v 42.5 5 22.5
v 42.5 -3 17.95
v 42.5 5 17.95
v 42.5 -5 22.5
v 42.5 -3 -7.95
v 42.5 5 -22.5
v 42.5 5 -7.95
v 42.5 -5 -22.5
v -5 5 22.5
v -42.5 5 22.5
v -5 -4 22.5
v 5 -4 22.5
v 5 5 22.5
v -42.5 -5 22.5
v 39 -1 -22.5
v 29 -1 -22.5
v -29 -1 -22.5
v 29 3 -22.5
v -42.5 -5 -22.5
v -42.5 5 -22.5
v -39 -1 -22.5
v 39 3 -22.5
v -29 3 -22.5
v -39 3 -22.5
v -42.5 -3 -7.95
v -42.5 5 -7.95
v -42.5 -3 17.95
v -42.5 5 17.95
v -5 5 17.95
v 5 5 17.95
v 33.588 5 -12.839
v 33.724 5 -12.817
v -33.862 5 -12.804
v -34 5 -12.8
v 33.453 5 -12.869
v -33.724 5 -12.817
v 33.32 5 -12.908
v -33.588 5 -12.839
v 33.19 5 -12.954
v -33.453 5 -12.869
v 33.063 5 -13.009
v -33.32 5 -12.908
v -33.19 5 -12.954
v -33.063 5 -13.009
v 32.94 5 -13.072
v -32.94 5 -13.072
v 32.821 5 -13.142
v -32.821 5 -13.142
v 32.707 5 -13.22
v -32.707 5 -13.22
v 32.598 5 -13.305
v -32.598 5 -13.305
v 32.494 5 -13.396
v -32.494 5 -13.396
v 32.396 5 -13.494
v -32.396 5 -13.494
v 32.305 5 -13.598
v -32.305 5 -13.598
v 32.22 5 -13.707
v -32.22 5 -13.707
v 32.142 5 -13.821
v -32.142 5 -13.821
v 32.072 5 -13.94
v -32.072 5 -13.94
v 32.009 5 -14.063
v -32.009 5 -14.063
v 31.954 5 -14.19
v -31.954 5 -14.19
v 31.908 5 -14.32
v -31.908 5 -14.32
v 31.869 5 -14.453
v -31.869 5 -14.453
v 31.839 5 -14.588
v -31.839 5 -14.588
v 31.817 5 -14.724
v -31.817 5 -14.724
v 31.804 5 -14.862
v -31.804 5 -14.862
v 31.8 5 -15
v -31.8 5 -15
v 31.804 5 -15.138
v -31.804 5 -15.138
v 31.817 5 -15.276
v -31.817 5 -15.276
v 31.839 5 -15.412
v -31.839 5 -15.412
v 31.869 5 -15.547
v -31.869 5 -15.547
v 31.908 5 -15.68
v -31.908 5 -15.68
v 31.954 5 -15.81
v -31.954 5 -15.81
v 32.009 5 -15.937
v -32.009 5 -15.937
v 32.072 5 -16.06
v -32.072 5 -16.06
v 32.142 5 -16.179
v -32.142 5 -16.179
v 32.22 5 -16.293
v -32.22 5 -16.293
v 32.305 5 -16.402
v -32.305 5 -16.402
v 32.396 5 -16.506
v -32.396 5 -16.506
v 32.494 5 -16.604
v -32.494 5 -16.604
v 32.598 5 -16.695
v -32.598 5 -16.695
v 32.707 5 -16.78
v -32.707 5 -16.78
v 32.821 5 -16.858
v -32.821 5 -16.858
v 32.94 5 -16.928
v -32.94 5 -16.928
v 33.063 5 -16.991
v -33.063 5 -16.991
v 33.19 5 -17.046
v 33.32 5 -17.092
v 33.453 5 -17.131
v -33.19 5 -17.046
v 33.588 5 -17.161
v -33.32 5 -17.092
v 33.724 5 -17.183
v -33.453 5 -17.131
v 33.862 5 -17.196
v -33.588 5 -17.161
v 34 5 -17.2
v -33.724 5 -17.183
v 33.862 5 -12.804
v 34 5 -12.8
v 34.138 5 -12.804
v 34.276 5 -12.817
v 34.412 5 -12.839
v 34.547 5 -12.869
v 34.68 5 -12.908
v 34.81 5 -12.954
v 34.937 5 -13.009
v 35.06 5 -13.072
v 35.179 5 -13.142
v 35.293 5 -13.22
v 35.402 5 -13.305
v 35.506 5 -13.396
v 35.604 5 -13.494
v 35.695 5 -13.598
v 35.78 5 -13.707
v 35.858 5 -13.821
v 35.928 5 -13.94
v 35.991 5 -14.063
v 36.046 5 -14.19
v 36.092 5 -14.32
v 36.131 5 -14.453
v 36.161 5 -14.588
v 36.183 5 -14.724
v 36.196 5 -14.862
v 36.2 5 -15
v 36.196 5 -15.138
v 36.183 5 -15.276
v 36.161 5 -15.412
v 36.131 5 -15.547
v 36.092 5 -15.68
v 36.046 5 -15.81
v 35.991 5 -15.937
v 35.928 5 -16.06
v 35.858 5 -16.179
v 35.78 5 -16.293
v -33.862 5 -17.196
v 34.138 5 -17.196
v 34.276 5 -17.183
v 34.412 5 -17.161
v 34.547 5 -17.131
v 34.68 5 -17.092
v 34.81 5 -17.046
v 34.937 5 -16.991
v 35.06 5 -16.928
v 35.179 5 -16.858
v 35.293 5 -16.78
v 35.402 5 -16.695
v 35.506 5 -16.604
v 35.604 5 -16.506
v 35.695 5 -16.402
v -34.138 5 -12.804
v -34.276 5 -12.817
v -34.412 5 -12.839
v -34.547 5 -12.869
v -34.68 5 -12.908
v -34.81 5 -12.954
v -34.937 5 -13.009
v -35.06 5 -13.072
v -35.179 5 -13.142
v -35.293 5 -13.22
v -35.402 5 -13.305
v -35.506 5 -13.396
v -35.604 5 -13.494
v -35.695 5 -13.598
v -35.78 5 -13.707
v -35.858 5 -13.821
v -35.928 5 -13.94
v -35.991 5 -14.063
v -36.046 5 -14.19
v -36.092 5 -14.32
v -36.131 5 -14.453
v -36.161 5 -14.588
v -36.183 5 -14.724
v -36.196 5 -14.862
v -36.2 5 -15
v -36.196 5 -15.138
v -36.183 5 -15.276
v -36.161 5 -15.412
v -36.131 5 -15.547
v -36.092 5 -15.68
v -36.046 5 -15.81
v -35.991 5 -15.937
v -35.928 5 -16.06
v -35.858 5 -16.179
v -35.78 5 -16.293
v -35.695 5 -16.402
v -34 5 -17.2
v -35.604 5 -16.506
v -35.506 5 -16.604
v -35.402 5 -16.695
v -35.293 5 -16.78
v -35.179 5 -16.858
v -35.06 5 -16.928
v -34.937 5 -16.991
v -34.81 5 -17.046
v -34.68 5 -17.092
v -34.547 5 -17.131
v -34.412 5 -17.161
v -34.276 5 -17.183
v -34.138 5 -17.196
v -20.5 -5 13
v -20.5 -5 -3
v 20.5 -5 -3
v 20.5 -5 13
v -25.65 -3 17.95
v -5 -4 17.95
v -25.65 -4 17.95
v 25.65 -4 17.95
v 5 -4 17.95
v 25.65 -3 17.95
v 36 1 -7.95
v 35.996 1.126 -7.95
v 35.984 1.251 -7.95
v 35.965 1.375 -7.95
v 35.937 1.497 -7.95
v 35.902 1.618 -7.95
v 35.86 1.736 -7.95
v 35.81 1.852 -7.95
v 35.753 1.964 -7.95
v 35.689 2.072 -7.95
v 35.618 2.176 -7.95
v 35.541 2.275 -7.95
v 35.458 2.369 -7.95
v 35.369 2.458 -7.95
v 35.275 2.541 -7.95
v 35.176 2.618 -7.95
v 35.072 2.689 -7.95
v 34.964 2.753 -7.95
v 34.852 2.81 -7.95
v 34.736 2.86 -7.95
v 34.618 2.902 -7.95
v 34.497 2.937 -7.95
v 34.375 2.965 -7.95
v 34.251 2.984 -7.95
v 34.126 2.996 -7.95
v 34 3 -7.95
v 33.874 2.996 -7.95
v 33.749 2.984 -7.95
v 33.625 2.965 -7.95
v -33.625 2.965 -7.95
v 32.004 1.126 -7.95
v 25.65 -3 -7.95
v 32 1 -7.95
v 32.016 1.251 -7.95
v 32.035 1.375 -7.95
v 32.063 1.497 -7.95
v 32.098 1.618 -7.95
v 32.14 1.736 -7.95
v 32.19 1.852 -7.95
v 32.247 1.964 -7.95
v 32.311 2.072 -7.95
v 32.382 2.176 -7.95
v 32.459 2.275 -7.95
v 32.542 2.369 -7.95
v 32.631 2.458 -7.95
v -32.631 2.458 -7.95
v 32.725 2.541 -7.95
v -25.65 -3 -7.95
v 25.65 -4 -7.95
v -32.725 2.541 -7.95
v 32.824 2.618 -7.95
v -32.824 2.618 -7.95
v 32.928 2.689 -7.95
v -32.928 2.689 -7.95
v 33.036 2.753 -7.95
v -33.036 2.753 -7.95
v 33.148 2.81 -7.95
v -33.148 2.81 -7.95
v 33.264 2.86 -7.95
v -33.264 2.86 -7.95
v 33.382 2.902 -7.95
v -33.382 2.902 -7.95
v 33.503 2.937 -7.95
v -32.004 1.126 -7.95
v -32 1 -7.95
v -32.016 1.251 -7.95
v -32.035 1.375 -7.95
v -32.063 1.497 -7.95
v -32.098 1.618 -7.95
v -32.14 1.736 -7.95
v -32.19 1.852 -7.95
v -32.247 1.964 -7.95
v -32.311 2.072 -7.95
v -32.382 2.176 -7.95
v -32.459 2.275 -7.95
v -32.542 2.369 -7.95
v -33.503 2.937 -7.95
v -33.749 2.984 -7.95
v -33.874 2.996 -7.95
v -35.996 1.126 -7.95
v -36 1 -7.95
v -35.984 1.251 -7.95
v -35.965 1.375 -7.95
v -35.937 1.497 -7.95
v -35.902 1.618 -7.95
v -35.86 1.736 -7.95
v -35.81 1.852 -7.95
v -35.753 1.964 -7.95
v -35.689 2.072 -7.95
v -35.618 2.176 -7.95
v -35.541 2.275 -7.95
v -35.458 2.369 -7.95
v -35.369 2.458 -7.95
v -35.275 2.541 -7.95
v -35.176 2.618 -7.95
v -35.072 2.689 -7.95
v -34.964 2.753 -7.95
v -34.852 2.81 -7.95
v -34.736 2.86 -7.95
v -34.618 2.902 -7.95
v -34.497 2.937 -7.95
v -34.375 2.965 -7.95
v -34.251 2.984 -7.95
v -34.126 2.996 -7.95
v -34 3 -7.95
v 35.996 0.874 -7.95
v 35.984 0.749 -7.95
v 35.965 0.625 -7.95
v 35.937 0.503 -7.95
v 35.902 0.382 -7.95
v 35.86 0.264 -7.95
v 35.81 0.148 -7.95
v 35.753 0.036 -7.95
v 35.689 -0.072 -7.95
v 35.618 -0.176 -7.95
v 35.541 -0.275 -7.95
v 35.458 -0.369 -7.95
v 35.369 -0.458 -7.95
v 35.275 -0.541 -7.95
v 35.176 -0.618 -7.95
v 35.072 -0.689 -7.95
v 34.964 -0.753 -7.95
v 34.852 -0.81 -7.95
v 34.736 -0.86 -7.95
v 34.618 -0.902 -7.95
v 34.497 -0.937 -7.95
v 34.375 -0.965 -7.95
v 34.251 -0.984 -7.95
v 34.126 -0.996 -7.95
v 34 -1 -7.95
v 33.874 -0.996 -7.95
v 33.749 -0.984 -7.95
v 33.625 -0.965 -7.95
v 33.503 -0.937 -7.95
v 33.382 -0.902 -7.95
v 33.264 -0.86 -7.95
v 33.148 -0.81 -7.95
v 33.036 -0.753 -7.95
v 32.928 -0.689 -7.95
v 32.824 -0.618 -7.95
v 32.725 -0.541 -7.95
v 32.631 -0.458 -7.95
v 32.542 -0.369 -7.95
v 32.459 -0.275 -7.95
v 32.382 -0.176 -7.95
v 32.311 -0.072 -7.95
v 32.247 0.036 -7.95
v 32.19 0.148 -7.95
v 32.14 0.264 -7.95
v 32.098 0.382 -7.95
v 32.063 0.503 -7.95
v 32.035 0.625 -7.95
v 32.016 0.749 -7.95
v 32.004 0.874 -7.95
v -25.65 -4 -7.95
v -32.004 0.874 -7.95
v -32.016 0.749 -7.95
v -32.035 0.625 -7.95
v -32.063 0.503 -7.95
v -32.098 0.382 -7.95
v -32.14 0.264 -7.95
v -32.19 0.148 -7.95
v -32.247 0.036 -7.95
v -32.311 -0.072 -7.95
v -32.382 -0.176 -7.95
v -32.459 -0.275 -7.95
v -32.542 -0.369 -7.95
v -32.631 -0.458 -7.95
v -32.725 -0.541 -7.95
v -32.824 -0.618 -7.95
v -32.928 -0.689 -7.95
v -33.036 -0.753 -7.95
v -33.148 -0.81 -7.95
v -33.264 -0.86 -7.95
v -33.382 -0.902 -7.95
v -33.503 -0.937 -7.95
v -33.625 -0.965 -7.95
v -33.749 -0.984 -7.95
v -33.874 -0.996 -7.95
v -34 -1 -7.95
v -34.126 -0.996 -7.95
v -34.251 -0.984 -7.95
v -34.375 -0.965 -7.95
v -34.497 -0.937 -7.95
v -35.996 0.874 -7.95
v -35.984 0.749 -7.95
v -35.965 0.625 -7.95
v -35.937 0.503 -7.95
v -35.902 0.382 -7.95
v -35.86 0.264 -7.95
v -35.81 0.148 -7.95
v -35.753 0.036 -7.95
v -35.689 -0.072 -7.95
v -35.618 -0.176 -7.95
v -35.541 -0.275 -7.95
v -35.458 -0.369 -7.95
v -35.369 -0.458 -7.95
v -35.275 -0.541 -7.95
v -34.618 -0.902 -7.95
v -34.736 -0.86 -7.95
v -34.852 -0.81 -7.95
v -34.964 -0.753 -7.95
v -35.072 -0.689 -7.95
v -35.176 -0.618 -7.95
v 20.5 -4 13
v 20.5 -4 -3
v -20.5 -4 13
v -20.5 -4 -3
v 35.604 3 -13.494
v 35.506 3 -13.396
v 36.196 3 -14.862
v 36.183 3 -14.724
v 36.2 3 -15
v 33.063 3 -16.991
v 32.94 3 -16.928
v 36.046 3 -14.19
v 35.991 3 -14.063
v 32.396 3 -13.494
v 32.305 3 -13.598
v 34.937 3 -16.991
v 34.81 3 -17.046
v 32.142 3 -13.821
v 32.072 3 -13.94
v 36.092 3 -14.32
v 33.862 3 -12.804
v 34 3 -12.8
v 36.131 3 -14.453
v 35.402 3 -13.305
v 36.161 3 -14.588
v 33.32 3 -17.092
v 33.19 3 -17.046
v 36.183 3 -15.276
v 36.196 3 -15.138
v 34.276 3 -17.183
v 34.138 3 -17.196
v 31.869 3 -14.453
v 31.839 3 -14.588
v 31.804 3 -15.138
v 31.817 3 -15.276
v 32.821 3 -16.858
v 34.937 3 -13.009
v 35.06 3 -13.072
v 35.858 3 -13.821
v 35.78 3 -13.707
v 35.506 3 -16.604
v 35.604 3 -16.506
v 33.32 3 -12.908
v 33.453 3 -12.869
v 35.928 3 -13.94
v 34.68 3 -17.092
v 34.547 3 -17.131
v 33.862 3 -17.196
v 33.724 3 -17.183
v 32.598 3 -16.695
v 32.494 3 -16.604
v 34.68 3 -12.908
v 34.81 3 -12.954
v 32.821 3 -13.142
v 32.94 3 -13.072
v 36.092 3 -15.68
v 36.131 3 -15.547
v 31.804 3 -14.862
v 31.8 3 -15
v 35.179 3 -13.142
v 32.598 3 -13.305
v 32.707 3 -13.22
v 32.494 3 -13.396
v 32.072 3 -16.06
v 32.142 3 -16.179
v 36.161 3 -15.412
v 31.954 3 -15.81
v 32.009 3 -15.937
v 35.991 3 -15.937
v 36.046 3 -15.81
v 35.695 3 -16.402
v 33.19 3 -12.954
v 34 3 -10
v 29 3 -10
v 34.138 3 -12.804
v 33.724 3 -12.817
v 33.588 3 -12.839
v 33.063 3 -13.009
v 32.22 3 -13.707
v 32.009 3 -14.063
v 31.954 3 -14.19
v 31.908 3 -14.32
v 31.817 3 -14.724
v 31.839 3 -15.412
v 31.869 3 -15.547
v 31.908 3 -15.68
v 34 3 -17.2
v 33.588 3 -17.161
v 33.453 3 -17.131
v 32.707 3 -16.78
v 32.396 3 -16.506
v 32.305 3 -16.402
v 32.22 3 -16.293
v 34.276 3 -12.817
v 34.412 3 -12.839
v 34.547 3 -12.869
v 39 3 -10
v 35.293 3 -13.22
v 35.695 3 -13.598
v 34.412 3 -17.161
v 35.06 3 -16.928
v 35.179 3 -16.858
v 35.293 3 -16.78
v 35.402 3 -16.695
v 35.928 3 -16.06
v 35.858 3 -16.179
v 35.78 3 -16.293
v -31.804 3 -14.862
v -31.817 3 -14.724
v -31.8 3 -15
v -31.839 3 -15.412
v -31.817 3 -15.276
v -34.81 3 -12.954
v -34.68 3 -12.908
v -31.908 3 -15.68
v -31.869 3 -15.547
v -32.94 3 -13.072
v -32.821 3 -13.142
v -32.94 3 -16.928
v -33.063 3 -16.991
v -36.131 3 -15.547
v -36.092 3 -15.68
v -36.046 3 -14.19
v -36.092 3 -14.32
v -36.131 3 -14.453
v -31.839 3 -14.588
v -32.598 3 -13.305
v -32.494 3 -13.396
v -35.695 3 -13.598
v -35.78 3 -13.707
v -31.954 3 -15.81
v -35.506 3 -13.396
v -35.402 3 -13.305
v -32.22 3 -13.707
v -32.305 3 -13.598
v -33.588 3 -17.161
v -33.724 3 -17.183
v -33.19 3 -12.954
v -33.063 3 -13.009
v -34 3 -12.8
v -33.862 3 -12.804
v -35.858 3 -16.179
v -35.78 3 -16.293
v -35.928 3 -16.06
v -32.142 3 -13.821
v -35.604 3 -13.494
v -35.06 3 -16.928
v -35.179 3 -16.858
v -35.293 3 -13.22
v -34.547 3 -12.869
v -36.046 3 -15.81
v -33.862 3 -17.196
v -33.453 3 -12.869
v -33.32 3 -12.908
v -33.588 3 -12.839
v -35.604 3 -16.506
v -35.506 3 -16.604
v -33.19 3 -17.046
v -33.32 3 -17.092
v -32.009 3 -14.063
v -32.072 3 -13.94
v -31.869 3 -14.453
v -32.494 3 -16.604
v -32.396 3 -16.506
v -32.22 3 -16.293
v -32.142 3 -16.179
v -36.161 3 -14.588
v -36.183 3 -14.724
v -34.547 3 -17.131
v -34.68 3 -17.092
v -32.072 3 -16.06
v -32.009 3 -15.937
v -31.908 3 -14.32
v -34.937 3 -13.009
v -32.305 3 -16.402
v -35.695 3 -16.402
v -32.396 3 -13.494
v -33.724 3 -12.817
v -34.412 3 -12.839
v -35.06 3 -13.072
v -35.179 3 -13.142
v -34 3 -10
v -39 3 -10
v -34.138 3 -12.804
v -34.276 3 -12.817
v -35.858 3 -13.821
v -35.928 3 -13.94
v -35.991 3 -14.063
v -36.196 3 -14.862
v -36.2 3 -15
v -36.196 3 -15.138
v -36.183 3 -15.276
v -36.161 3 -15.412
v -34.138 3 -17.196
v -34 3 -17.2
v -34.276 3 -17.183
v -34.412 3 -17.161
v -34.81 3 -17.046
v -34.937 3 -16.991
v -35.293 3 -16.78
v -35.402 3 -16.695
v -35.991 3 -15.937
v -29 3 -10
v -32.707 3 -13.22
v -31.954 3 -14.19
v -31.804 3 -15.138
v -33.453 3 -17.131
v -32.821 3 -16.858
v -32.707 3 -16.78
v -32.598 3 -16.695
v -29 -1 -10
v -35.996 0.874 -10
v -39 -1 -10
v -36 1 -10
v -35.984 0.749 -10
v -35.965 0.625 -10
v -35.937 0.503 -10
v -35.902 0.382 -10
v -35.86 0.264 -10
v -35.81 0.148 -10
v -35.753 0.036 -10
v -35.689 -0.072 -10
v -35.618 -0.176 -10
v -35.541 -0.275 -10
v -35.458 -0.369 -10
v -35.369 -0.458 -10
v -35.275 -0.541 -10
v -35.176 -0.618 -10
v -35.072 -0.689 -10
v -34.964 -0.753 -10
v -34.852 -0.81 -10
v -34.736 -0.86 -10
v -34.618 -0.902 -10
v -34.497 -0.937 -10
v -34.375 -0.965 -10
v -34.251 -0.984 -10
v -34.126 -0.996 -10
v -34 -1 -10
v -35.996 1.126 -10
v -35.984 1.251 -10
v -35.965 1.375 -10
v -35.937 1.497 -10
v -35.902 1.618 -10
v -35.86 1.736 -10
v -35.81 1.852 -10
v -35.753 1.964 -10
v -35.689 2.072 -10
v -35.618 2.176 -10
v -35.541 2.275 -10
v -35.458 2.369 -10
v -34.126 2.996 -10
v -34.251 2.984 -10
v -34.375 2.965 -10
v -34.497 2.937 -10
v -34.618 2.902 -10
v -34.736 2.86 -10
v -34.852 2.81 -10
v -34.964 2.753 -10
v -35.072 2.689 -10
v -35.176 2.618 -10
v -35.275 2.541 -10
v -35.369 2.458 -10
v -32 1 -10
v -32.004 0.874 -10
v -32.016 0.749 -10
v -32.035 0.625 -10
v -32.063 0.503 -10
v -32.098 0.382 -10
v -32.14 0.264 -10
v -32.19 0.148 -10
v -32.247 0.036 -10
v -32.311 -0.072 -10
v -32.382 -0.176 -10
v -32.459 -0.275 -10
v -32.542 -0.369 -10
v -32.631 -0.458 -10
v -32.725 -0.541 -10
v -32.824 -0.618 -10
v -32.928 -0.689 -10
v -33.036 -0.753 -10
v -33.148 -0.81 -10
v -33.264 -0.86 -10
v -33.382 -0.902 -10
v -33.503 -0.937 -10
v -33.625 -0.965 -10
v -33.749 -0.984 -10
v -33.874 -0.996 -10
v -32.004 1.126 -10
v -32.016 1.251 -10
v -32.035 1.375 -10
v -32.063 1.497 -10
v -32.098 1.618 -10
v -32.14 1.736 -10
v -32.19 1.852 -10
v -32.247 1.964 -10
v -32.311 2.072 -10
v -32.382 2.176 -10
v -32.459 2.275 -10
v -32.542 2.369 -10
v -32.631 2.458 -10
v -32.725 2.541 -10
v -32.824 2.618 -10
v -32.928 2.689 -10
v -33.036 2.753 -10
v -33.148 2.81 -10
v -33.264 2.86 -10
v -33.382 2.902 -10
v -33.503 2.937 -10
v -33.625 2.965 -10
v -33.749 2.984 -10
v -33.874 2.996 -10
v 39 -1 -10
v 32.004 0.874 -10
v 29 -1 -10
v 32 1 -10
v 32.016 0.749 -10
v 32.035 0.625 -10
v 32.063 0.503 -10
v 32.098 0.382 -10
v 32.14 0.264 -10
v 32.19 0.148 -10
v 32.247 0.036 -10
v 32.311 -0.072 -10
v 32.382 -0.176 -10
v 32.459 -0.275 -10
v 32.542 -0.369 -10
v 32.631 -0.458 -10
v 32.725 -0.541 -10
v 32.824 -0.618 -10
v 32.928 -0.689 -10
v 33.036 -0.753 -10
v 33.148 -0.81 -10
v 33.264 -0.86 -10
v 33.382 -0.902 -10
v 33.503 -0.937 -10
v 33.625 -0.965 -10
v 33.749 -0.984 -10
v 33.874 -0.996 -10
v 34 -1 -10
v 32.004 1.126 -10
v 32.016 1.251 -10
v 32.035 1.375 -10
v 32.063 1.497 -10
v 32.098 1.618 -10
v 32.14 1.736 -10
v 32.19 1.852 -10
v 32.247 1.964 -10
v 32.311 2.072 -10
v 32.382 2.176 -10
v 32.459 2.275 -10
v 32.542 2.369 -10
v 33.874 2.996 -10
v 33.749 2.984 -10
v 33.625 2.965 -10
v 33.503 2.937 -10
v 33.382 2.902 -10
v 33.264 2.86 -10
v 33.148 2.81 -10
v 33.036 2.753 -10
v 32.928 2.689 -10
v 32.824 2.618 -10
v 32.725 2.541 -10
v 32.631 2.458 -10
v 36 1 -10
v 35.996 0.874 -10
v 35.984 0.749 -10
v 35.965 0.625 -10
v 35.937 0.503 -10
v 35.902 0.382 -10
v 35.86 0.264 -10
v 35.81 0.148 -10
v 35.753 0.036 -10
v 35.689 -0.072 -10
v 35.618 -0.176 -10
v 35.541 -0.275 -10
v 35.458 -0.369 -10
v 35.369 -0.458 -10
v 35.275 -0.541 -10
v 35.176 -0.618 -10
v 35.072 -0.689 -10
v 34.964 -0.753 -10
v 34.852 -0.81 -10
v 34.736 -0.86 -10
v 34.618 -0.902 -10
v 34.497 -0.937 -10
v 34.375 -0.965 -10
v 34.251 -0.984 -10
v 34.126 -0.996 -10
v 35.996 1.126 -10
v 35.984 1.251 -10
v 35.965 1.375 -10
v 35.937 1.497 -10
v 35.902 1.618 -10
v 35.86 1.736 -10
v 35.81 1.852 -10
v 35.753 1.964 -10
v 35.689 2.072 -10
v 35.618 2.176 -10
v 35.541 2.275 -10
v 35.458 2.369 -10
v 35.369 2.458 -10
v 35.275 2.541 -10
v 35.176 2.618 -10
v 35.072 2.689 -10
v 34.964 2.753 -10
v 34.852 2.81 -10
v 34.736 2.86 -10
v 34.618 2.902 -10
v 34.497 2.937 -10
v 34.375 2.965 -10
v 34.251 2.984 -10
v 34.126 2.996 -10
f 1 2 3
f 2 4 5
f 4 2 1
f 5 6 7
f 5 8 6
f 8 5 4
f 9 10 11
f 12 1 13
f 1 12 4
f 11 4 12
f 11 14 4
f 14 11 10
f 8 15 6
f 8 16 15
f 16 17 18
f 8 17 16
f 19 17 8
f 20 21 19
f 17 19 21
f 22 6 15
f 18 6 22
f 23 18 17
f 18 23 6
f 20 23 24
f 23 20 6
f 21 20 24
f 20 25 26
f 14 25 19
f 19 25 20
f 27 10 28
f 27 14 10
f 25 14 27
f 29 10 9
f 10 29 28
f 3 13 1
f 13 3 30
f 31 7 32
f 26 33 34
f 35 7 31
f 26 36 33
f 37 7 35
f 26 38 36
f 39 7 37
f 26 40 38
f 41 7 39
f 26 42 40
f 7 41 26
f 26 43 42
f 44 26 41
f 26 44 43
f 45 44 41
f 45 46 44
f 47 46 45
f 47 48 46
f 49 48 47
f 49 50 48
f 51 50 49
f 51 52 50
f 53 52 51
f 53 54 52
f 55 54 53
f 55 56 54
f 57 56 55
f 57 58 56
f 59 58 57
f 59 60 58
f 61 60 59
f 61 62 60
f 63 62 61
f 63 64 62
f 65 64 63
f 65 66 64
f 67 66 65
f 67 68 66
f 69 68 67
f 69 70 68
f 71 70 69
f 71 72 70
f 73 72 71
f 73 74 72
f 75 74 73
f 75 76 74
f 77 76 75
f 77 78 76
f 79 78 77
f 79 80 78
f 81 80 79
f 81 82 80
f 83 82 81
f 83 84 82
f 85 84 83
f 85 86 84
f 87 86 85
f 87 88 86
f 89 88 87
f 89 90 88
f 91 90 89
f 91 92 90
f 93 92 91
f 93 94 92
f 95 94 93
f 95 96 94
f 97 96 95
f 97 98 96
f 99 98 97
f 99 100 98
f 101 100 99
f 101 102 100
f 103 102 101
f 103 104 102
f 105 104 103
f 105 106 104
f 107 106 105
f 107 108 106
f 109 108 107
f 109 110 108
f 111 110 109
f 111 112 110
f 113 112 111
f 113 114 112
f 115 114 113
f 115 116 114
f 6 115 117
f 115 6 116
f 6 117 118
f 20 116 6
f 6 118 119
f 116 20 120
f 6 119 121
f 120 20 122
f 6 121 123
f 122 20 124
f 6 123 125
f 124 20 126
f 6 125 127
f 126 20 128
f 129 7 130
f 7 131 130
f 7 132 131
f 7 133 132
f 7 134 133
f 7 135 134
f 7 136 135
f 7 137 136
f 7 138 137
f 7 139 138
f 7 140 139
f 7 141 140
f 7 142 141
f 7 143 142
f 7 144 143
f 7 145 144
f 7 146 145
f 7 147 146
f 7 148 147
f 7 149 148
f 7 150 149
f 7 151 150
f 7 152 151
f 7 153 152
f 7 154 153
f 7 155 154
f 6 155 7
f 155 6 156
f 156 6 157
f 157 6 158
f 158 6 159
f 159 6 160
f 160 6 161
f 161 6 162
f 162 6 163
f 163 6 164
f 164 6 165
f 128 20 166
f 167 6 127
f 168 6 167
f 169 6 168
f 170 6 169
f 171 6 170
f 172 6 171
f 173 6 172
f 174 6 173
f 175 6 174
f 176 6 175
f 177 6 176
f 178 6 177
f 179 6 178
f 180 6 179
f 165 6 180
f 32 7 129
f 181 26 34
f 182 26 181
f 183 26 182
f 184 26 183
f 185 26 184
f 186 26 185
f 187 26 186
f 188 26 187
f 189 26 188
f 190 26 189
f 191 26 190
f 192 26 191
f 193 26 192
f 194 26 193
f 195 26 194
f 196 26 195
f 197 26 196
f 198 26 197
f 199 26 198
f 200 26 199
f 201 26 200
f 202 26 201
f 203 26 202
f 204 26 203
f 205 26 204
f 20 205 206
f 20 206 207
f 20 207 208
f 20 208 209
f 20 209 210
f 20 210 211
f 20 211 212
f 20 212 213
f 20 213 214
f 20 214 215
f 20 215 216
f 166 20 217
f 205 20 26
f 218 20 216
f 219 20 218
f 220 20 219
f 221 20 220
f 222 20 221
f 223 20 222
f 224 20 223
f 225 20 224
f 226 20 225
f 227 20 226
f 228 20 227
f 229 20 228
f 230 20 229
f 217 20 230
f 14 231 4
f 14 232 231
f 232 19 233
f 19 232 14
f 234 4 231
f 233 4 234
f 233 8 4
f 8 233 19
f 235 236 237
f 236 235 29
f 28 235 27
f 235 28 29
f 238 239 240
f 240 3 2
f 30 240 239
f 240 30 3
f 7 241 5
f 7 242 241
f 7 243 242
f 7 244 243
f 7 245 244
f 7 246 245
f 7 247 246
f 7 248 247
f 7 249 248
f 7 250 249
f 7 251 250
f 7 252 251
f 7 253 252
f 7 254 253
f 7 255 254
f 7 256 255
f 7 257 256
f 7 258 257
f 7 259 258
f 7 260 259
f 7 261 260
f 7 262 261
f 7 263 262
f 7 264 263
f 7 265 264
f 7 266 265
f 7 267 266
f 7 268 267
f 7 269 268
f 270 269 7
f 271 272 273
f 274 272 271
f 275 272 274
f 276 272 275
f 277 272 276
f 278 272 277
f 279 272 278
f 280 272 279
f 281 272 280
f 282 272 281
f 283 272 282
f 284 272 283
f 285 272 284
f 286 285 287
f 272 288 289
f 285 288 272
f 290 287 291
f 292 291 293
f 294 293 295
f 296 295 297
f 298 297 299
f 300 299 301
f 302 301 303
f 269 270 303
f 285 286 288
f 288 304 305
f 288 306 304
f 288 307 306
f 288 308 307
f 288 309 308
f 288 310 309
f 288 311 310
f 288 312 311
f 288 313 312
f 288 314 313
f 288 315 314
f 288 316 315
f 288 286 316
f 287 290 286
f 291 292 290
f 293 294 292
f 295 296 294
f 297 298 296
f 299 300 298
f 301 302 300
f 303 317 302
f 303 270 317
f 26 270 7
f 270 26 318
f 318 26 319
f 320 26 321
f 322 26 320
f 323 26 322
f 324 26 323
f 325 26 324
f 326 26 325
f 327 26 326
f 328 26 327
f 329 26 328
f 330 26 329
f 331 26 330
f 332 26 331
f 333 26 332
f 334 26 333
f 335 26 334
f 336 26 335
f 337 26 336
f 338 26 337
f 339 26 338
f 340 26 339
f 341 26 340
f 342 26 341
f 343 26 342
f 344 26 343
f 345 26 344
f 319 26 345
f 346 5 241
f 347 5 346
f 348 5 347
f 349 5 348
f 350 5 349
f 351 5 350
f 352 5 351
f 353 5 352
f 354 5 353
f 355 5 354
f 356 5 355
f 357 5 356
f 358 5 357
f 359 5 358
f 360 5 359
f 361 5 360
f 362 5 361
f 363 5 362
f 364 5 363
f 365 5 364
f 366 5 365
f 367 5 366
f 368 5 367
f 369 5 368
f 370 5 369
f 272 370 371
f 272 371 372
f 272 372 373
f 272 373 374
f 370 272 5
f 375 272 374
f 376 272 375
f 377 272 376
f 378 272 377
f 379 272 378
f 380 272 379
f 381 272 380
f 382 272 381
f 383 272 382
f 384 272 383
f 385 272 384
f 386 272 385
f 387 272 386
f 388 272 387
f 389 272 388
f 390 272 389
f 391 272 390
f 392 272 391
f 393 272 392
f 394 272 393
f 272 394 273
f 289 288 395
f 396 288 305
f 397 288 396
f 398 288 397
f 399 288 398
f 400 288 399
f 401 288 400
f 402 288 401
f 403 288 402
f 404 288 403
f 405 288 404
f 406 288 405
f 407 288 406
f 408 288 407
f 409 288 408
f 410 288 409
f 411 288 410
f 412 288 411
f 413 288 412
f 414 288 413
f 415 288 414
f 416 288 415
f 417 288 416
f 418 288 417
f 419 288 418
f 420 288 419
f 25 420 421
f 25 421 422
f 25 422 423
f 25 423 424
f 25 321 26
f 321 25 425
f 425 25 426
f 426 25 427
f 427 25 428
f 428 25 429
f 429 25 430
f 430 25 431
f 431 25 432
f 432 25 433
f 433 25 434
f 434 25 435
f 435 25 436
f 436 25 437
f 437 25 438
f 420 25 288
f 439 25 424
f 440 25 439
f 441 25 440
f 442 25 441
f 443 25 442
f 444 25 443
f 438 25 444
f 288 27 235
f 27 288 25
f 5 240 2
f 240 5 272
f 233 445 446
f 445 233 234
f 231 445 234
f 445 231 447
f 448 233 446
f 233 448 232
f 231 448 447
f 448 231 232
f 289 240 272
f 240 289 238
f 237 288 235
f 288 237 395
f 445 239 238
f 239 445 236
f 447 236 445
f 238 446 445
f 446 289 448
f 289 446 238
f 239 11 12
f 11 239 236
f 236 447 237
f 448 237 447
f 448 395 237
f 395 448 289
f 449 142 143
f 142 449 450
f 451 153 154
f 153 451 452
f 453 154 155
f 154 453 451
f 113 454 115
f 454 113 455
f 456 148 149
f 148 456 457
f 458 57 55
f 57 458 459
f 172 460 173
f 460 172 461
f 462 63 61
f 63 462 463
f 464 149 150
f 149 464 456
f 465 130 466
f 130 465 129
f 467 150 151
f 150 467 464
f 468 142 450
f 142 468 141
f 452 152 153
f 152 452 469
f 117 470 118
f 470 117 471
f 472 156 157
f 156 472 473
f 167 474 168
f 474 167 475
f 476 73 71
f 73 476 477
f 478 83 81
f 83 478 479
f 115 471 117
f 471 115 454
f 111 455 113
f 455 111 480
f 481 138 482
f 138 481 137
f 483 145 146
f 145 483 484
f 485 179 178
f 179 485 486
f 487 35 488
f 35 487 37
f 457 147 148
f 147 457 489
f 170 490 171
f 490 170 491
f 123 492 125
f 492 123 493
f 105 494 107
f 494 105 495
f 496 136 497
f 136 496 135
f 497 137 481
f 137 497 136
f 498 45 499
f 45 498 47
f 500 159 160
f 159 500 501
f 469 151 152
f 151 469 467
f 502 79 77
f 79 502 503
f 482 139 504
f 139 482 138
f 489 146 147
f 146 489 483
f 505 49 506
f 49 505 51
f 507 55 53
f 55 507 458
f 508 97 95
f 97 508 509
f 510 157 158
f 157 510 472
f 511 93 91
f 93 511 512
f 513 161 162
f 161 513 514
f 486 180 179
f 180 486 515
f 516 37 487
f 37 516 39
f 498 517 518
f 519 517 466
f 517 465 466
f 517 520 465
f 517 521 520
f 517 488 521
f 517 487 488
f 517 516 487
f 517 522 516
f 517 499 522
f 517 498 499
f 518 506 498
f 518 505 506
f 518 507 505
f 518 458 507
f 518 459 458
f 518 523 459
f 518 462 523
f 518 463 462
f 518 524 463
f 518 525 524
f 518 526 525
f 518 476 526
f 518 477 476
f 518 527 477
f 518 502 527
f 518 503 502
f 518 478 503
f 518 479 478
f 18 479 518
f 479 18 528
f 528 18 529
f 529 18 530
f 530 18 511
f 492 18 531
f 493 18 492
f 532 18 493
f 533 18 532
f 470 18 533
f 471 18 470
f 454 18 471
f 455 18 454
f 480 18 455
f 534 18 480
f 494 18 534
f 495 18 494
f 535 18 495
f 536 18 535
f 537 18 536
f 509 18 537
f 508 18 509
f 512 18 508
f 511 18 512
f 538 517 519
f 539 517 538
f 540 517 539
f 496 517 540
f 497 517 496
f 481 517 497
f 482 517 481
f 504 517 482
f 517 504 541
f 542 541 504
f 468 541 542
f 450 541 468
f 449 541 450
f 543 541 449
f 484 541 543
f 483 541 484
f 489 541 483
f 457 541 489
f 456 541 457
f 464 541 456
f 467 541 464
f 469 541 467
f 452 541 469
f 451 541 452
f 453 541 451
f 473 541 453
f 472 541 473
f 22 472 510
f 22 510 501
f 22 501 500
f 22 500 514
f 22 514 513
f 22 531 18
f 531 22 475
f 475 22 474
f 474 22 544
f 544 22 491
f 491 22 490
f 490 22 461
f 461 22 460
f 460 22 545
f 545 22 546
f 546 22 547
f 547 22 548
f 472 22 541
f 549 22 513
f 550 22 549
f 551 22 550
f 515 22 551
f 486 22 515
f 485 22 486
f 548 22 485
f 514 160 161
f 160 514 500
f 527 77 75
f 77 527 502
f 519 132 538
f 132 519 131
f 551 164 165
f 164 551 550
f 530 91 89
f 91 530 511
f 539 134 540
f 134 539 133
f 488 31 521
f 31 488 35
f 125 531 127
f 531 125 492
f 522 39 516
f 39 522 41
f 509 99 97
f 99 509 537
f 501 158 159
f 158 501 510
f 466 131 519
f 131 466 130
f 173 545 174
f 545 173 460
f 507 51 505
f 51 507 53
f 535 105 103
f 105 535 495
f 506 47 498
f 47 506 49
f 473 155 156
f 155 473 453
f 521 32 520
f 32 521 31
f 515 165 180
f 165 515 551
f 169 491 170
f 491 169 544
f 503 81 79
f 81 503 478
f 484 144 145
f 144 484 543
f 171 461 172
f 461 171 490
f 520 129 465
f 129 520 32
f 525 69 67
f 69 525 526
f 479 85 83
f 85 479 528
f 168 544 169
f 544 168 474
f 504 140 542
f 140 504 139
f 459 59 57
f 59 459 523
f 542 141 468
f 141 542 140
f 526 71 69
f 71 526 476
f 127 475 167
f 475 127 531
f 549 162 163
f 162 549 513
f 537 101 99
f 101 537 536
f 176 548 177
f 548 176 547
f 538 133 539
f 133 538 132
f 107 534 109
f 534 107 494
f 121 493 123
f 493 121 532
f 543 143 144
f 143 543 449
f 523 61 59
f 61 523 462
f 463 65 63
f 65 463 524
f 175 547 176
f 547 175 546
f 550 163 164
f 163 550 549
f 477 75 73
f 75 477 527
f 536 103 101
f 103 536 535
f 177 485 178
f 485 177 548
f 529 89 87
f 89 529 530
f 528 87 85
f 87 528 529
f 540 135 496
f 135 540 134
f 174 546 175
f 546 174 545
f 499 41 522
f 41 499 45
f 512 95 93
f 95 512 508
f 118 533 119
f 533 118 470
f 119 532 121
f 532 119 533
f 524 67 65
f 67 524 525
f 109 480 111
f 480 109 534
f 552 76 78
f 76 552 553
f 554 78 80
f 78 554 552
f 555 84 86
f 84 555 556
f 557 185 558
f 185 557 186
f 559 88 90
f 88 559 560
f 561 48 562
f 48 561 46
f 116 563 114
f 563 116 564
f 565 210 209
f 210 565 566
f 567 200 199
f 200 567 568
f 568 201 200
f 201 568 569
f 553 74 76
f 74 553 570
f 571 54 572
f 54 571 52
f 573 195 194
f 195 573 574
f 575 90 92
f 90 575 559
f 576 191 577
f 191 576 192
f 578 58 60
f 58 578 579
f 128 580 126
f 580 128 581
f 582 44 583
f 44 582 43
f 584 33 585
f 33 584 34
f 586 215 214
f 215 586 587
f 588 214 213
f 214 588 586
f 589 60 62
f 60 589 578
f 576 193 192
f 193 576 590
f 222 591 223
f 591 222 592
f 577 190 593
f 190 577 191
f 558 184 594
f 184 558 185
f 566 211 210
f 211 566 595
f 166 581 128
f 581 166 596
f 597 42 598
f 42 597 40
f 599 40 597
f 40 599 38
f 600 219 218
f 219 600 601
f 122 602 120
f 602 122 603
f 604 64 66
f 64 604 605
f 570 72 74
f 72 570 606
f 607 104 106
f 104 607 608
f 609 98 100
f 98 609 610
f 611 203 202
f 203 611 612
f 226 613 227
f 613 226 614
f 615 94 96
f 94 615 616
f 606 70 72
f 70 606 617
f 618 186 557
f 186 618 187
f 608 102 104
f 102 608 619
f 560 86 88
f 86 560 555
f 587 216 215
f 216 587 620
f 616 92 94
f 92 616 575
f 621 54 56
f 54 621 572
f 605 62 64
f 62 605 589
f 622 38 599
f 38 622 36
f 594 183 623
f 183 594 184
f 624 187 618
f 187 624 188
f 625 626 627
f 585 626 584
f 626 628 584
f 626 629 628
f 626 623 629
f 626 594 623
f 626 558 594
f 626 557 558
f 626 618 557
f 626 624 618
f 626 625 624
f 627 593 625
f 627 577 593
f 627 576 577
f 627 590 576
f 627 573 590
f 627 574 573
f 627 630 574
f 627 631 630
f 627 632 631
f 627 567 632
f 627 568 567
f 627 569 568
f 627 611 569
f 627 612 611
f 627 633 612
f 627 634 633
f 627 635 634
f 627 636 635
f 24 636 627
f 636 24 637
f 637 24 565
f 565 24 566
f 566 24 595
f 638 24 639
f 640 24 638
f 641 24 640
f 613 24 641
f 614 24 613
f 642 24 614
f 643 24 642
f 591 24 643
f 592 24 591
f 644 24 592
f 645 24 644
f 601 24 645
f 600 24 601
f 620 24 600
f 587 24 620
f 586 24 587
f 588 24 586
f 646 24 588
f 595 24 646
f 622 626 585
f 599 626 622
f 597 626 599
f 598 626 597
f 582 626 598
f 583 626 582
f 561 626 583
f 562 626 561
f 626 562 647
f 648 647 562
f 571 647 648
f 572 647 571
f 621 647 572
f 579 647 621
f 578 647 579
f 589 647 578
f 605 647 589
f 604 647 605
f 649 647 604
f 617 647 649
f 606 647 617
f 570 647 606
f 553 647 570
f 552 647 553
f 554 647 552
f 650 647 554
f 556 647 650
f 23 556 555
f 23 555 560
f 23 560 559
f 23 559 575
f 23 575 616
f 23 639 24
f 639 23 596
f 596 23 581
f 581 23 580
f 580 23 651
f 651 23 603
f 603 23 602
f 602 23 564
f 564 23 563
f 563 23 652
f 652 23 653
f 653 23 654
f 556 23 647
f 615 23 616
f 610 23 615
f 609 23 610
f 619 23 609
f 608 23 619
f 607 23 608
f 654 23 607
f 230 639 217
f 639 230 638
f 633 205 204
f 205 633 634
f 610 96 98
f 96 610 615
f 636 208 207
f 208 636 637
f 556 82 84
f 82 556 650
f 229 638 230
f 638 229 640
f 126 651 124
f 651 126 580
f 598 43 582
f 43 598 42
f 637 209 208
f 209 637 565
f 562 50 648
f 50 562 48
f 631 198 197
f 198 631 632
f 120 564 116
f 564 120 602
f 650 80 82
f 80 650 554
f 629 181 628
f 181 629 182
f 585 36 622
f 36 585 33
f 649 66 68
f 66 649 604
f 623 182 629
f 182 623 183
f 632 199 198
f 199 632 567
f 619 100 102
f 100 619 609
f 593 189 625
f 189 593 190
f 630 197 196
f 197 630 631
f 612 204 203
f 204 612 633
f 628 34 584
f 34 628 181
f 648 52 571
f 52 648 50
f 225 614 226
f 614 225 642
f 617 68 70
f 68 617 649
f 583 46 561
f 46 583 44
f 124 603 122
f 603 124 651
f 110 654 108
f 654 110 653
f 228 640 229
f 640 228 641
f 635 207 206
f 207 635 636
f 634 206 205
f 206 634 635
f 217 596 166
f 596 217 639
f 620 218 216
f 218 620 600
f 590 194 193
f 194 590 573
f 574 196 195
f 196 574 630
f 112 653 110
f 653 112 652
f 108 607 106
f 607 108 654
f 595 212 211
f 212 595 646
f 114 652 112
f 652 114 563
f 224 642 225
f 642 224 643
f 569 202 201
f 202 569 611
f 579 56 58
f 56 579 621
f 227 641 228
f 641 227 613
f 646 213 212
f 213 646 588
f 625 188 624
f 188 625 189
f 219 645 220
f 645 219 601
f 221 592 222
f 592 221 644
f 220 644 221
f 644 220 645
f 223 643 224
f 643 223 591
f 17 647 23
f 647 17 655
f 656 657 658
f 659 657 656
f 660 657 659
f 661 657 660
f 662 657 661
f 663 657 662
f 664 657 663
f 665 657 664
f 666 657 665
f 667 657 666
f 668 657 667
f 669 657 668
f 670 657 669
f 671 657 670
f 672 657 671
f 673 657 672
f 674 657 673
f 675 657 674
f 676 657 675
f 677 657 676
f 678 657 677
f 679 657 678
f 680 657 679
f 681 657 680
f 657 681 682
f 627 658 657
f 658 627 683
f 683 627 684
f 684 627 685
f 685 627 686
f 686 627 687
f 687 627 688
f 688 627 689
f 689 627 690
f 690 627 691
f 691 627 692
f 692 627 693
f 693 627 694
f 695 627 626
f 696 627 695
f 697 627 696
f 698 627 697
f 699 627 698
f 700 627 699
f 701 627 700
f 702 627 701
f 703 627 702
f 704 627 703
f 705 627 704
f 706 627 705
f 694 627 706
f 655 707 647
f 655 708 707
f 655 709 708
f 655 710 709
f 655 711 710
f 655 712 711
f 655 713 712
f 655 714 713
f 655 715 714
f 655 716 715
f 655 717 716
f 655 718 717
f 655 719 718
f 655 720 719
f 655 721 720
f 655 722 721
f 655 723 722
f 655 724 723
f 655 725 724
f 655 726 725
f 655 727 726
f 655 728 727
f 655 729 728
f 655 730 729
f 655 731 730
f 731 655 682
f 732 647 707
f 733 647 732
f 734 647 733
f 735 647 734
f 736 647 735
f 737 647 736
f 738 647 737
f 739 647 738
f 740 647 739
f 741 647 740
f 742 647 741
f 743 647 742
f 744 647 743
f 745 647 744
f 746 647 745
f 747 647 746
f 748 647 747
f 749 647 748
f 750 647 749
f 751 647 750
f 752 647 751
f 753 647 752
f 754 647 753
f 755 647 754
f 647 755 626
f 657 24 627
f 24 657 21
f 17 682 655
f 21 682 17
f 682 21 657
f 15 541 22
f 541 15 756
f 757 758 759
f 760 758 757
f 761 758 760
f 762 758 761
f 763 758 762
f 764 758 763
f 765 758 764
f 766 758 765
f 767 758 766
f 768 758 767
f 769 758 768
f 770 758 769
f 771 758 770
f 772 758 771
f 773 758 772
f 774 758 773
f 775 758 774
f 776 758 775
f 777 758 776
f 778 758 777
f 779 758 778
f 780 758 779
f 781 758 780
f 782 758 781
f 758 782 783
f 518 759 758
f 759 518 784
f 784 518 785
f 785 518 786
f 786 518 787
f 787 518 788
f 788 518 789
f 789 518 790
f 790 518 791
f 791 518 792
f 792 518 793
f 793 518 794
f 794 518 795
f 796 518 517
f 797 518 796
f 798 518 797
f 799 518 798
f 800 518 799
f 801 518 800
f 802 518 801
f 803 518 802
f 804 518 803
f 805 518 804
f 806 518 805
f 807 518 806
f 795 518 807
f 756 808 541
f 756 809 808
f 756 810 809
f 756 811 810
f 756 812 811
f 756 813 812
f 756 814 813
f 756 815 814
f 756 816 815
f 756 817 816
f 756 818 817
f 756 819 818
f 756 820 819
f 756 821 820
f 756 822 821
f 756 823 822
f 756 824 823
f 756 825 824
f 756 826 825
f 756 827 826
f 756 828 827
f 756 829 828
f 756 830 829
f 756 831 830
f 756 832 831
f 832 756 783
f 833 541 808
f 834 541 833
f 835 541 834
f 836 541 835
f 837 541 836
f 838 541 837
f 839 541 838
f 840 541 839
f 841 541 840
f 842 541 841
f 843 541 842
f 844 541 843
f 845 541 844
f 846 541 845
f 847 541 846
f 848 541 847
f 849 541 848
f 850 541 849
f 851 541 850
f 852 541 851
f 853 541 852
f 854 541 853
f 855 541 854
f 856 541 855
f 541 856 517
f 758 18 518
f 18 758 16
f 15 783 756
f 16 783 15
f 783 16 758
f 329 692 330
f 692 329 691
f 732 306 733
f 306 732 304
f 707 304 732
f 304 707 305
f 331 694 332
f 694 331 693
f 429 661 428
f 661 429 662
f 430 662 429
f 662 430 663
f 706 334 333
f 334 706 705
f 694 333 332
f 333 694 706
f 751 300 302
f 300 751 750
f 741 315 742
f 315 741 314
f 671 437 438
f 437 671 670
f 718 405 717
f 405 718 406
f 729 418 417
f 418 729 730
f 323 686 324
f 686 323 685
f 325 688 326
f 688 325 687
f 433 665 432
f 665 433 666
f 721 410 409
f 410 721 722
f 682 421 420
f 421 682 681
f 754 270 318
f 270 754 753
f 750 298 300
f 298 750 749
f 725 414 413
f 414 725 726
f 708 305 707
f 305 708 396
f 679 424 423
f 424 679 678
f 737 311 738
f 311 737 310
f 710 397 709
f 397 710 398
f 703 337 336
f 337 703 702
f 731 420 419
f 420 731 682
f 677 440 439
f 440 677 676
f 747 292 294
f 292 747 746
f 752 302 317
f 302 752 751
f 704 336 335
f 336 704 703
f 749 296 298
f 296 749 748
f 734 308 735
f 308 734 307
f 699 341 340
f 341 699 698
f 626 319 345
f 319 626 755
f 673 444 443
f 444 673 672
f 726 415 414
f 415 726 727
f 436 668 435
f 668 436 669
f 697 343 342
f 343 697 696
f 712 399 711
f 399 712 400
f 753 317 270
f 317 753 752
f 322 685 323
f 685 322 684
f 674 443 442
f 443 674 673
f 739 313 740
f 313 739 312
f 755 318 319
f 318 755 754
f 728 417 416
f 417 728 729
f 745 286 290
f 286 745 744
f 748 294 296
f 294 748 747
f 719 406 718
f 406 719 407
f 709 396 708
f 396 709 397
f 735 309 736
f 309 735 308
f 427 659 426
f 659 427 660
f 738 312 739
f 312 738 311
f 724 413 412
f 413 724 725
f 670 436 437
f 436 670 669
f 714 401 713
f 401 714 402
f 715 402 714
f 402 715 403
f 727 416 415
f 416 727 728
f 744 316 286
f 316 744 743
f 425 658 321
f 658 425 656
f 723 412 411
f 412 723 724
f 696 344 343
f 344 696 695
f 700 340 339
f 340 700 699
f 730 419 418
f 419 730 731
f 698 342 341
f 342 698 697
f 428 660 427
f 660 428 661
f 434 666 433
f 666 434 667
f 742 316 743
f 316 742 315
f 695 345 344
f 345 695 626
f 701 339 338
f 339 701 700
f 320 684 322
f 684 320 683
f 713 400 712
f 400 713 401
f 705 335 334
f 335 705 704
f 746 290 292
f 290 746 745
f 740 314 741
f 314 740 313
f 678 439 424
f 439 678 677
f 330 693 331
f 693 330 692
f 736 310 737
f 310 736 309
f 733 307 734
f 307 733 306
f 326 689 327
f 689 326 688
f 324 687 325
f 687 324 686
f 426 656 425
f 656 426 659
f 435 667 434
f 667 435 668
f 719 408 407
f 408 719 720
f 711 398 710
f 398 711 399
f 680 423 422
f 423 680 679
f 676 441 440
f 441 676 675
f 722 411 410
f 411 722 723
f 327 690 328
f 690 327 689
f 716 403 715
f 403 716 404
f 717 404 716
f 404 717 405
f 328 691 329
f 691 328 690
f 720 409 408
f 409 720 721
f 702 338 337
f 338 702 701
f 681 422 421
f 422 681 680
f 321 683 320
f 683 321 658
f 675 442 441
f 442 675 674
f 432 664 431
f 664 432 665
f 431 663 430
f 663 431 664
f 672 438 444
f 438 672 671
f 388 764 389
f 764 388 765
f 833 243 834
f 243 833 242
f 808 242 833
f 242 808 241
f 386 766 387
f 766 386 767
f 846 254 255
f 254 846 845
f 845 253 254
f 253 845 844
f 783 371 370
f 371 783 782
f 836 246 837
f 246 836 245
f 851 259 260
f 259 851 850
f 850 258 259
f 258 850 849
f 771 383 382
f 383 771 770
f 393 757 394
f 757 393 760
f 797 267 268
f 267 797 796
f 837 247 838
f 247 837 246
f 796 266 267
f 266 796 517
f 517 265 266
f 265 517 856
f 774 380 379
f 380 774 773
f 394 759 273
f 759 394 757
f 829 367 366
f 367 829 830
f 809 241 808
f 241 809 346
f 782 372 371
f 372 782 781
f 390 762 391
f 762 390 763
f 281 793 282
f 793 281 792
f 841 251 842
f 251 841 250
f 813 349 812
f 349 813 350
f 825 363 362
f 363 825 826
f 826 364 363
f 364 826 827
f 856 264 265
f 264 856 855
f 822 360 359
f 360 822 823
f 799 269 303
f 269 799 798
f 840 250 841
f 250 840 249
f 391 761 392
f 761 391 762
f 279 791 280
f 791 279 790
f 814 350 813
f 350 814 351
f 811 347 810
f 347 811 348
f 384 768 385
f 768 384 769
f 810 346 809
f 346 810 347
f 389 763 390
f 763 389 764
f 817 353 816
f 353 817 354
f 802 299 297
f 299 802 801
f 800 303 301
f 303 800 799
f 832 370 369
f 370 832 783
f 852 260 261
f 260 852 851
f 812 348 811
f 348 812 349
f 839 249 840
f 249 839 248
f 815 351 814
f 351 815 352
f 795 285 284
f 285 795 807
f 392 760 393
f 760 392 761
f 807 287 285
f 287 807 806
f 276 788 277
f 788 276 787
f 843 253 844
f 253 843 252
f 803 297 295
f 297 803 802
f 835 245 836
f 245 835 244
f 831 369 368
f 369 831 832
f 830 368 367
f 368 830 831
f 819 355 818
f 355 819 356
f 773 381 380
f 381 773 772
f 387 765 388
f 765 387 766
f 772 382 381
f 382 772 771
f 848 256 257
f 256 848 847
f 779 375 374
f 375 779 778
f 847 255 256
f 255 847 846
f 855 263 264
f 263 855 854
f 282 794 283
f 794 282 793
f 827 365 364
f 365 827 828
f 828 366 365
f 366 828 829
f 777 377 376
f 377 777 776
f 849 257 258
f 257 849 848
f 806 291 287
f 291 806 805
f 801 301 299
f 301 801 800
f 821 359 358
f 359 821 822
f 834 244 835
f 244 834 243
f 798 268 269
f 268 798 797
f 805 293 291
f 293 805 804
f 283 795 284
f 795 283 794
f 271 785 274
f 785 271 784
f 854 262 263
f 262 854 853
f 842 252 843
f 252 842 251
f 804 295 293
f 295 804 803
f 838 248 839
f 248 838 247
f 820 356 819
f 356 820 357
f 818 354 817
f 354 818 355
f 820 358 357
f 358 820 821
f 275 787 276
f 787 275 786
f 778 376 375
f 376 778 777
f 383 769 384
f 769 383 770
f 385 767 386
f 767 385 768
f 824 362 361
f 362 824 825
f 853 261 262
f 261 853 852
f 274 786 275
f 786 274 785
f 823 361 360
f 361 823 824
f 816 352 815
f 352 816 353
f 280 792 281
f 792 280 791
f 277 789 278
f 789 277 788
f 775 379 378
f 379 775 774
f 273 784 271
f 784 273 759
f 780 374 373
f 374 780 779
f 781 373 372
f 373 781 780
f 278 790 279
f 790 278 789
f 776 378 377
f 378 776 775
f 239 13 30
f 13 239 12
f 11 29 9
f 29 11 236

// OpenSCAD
mod_length = 85;


module boltBox() {
	cube(size=[10,4,20], center=true);
}

module clipHole() {
	cylinder(r=2.2, h=8, center=true);
}

module removeHole() {
	cylinder(d=4, h=6, center=true);
}

module trayContainer() {
	difference() {
		cube(size=[mod_length,10,45], center=true);
		translate([0,1,5]) 
			cube(size=[mod_length+.2,8,25.9], center=true);
		//
		translate([0,0,5]) 
			cube(size=[41,12,16], center=true);
		//Inner holder
		translate([0,0,5])
			cube(size=[51.3,8,25.9], center=true);
		// Screw Holes
		translate([mod_length/2.5, 15-8, -15])
			rotate([90,0,0]) 
				clipHole();
		translate([-mod_length/2.5, 15-8, -15])
			rotate([90,0,0]) 
				clipHole();			
		//Bolt holes
		translate([-mod_length/2.5,1,-20])
			boltBox();
		translate([mod_length/2.5,1,-20])
			boltBox();
		//Remove holes
		translate([-mod_length/2.5,1,-10])
			removeHole();
		translate([mod_length/2.5,1,-10])
			removeHole();
		//big screw hole
		translate([0,1,20])
			cube([10,10,10], center=true);
	}
}



$fn=100;
trayContainer();	
